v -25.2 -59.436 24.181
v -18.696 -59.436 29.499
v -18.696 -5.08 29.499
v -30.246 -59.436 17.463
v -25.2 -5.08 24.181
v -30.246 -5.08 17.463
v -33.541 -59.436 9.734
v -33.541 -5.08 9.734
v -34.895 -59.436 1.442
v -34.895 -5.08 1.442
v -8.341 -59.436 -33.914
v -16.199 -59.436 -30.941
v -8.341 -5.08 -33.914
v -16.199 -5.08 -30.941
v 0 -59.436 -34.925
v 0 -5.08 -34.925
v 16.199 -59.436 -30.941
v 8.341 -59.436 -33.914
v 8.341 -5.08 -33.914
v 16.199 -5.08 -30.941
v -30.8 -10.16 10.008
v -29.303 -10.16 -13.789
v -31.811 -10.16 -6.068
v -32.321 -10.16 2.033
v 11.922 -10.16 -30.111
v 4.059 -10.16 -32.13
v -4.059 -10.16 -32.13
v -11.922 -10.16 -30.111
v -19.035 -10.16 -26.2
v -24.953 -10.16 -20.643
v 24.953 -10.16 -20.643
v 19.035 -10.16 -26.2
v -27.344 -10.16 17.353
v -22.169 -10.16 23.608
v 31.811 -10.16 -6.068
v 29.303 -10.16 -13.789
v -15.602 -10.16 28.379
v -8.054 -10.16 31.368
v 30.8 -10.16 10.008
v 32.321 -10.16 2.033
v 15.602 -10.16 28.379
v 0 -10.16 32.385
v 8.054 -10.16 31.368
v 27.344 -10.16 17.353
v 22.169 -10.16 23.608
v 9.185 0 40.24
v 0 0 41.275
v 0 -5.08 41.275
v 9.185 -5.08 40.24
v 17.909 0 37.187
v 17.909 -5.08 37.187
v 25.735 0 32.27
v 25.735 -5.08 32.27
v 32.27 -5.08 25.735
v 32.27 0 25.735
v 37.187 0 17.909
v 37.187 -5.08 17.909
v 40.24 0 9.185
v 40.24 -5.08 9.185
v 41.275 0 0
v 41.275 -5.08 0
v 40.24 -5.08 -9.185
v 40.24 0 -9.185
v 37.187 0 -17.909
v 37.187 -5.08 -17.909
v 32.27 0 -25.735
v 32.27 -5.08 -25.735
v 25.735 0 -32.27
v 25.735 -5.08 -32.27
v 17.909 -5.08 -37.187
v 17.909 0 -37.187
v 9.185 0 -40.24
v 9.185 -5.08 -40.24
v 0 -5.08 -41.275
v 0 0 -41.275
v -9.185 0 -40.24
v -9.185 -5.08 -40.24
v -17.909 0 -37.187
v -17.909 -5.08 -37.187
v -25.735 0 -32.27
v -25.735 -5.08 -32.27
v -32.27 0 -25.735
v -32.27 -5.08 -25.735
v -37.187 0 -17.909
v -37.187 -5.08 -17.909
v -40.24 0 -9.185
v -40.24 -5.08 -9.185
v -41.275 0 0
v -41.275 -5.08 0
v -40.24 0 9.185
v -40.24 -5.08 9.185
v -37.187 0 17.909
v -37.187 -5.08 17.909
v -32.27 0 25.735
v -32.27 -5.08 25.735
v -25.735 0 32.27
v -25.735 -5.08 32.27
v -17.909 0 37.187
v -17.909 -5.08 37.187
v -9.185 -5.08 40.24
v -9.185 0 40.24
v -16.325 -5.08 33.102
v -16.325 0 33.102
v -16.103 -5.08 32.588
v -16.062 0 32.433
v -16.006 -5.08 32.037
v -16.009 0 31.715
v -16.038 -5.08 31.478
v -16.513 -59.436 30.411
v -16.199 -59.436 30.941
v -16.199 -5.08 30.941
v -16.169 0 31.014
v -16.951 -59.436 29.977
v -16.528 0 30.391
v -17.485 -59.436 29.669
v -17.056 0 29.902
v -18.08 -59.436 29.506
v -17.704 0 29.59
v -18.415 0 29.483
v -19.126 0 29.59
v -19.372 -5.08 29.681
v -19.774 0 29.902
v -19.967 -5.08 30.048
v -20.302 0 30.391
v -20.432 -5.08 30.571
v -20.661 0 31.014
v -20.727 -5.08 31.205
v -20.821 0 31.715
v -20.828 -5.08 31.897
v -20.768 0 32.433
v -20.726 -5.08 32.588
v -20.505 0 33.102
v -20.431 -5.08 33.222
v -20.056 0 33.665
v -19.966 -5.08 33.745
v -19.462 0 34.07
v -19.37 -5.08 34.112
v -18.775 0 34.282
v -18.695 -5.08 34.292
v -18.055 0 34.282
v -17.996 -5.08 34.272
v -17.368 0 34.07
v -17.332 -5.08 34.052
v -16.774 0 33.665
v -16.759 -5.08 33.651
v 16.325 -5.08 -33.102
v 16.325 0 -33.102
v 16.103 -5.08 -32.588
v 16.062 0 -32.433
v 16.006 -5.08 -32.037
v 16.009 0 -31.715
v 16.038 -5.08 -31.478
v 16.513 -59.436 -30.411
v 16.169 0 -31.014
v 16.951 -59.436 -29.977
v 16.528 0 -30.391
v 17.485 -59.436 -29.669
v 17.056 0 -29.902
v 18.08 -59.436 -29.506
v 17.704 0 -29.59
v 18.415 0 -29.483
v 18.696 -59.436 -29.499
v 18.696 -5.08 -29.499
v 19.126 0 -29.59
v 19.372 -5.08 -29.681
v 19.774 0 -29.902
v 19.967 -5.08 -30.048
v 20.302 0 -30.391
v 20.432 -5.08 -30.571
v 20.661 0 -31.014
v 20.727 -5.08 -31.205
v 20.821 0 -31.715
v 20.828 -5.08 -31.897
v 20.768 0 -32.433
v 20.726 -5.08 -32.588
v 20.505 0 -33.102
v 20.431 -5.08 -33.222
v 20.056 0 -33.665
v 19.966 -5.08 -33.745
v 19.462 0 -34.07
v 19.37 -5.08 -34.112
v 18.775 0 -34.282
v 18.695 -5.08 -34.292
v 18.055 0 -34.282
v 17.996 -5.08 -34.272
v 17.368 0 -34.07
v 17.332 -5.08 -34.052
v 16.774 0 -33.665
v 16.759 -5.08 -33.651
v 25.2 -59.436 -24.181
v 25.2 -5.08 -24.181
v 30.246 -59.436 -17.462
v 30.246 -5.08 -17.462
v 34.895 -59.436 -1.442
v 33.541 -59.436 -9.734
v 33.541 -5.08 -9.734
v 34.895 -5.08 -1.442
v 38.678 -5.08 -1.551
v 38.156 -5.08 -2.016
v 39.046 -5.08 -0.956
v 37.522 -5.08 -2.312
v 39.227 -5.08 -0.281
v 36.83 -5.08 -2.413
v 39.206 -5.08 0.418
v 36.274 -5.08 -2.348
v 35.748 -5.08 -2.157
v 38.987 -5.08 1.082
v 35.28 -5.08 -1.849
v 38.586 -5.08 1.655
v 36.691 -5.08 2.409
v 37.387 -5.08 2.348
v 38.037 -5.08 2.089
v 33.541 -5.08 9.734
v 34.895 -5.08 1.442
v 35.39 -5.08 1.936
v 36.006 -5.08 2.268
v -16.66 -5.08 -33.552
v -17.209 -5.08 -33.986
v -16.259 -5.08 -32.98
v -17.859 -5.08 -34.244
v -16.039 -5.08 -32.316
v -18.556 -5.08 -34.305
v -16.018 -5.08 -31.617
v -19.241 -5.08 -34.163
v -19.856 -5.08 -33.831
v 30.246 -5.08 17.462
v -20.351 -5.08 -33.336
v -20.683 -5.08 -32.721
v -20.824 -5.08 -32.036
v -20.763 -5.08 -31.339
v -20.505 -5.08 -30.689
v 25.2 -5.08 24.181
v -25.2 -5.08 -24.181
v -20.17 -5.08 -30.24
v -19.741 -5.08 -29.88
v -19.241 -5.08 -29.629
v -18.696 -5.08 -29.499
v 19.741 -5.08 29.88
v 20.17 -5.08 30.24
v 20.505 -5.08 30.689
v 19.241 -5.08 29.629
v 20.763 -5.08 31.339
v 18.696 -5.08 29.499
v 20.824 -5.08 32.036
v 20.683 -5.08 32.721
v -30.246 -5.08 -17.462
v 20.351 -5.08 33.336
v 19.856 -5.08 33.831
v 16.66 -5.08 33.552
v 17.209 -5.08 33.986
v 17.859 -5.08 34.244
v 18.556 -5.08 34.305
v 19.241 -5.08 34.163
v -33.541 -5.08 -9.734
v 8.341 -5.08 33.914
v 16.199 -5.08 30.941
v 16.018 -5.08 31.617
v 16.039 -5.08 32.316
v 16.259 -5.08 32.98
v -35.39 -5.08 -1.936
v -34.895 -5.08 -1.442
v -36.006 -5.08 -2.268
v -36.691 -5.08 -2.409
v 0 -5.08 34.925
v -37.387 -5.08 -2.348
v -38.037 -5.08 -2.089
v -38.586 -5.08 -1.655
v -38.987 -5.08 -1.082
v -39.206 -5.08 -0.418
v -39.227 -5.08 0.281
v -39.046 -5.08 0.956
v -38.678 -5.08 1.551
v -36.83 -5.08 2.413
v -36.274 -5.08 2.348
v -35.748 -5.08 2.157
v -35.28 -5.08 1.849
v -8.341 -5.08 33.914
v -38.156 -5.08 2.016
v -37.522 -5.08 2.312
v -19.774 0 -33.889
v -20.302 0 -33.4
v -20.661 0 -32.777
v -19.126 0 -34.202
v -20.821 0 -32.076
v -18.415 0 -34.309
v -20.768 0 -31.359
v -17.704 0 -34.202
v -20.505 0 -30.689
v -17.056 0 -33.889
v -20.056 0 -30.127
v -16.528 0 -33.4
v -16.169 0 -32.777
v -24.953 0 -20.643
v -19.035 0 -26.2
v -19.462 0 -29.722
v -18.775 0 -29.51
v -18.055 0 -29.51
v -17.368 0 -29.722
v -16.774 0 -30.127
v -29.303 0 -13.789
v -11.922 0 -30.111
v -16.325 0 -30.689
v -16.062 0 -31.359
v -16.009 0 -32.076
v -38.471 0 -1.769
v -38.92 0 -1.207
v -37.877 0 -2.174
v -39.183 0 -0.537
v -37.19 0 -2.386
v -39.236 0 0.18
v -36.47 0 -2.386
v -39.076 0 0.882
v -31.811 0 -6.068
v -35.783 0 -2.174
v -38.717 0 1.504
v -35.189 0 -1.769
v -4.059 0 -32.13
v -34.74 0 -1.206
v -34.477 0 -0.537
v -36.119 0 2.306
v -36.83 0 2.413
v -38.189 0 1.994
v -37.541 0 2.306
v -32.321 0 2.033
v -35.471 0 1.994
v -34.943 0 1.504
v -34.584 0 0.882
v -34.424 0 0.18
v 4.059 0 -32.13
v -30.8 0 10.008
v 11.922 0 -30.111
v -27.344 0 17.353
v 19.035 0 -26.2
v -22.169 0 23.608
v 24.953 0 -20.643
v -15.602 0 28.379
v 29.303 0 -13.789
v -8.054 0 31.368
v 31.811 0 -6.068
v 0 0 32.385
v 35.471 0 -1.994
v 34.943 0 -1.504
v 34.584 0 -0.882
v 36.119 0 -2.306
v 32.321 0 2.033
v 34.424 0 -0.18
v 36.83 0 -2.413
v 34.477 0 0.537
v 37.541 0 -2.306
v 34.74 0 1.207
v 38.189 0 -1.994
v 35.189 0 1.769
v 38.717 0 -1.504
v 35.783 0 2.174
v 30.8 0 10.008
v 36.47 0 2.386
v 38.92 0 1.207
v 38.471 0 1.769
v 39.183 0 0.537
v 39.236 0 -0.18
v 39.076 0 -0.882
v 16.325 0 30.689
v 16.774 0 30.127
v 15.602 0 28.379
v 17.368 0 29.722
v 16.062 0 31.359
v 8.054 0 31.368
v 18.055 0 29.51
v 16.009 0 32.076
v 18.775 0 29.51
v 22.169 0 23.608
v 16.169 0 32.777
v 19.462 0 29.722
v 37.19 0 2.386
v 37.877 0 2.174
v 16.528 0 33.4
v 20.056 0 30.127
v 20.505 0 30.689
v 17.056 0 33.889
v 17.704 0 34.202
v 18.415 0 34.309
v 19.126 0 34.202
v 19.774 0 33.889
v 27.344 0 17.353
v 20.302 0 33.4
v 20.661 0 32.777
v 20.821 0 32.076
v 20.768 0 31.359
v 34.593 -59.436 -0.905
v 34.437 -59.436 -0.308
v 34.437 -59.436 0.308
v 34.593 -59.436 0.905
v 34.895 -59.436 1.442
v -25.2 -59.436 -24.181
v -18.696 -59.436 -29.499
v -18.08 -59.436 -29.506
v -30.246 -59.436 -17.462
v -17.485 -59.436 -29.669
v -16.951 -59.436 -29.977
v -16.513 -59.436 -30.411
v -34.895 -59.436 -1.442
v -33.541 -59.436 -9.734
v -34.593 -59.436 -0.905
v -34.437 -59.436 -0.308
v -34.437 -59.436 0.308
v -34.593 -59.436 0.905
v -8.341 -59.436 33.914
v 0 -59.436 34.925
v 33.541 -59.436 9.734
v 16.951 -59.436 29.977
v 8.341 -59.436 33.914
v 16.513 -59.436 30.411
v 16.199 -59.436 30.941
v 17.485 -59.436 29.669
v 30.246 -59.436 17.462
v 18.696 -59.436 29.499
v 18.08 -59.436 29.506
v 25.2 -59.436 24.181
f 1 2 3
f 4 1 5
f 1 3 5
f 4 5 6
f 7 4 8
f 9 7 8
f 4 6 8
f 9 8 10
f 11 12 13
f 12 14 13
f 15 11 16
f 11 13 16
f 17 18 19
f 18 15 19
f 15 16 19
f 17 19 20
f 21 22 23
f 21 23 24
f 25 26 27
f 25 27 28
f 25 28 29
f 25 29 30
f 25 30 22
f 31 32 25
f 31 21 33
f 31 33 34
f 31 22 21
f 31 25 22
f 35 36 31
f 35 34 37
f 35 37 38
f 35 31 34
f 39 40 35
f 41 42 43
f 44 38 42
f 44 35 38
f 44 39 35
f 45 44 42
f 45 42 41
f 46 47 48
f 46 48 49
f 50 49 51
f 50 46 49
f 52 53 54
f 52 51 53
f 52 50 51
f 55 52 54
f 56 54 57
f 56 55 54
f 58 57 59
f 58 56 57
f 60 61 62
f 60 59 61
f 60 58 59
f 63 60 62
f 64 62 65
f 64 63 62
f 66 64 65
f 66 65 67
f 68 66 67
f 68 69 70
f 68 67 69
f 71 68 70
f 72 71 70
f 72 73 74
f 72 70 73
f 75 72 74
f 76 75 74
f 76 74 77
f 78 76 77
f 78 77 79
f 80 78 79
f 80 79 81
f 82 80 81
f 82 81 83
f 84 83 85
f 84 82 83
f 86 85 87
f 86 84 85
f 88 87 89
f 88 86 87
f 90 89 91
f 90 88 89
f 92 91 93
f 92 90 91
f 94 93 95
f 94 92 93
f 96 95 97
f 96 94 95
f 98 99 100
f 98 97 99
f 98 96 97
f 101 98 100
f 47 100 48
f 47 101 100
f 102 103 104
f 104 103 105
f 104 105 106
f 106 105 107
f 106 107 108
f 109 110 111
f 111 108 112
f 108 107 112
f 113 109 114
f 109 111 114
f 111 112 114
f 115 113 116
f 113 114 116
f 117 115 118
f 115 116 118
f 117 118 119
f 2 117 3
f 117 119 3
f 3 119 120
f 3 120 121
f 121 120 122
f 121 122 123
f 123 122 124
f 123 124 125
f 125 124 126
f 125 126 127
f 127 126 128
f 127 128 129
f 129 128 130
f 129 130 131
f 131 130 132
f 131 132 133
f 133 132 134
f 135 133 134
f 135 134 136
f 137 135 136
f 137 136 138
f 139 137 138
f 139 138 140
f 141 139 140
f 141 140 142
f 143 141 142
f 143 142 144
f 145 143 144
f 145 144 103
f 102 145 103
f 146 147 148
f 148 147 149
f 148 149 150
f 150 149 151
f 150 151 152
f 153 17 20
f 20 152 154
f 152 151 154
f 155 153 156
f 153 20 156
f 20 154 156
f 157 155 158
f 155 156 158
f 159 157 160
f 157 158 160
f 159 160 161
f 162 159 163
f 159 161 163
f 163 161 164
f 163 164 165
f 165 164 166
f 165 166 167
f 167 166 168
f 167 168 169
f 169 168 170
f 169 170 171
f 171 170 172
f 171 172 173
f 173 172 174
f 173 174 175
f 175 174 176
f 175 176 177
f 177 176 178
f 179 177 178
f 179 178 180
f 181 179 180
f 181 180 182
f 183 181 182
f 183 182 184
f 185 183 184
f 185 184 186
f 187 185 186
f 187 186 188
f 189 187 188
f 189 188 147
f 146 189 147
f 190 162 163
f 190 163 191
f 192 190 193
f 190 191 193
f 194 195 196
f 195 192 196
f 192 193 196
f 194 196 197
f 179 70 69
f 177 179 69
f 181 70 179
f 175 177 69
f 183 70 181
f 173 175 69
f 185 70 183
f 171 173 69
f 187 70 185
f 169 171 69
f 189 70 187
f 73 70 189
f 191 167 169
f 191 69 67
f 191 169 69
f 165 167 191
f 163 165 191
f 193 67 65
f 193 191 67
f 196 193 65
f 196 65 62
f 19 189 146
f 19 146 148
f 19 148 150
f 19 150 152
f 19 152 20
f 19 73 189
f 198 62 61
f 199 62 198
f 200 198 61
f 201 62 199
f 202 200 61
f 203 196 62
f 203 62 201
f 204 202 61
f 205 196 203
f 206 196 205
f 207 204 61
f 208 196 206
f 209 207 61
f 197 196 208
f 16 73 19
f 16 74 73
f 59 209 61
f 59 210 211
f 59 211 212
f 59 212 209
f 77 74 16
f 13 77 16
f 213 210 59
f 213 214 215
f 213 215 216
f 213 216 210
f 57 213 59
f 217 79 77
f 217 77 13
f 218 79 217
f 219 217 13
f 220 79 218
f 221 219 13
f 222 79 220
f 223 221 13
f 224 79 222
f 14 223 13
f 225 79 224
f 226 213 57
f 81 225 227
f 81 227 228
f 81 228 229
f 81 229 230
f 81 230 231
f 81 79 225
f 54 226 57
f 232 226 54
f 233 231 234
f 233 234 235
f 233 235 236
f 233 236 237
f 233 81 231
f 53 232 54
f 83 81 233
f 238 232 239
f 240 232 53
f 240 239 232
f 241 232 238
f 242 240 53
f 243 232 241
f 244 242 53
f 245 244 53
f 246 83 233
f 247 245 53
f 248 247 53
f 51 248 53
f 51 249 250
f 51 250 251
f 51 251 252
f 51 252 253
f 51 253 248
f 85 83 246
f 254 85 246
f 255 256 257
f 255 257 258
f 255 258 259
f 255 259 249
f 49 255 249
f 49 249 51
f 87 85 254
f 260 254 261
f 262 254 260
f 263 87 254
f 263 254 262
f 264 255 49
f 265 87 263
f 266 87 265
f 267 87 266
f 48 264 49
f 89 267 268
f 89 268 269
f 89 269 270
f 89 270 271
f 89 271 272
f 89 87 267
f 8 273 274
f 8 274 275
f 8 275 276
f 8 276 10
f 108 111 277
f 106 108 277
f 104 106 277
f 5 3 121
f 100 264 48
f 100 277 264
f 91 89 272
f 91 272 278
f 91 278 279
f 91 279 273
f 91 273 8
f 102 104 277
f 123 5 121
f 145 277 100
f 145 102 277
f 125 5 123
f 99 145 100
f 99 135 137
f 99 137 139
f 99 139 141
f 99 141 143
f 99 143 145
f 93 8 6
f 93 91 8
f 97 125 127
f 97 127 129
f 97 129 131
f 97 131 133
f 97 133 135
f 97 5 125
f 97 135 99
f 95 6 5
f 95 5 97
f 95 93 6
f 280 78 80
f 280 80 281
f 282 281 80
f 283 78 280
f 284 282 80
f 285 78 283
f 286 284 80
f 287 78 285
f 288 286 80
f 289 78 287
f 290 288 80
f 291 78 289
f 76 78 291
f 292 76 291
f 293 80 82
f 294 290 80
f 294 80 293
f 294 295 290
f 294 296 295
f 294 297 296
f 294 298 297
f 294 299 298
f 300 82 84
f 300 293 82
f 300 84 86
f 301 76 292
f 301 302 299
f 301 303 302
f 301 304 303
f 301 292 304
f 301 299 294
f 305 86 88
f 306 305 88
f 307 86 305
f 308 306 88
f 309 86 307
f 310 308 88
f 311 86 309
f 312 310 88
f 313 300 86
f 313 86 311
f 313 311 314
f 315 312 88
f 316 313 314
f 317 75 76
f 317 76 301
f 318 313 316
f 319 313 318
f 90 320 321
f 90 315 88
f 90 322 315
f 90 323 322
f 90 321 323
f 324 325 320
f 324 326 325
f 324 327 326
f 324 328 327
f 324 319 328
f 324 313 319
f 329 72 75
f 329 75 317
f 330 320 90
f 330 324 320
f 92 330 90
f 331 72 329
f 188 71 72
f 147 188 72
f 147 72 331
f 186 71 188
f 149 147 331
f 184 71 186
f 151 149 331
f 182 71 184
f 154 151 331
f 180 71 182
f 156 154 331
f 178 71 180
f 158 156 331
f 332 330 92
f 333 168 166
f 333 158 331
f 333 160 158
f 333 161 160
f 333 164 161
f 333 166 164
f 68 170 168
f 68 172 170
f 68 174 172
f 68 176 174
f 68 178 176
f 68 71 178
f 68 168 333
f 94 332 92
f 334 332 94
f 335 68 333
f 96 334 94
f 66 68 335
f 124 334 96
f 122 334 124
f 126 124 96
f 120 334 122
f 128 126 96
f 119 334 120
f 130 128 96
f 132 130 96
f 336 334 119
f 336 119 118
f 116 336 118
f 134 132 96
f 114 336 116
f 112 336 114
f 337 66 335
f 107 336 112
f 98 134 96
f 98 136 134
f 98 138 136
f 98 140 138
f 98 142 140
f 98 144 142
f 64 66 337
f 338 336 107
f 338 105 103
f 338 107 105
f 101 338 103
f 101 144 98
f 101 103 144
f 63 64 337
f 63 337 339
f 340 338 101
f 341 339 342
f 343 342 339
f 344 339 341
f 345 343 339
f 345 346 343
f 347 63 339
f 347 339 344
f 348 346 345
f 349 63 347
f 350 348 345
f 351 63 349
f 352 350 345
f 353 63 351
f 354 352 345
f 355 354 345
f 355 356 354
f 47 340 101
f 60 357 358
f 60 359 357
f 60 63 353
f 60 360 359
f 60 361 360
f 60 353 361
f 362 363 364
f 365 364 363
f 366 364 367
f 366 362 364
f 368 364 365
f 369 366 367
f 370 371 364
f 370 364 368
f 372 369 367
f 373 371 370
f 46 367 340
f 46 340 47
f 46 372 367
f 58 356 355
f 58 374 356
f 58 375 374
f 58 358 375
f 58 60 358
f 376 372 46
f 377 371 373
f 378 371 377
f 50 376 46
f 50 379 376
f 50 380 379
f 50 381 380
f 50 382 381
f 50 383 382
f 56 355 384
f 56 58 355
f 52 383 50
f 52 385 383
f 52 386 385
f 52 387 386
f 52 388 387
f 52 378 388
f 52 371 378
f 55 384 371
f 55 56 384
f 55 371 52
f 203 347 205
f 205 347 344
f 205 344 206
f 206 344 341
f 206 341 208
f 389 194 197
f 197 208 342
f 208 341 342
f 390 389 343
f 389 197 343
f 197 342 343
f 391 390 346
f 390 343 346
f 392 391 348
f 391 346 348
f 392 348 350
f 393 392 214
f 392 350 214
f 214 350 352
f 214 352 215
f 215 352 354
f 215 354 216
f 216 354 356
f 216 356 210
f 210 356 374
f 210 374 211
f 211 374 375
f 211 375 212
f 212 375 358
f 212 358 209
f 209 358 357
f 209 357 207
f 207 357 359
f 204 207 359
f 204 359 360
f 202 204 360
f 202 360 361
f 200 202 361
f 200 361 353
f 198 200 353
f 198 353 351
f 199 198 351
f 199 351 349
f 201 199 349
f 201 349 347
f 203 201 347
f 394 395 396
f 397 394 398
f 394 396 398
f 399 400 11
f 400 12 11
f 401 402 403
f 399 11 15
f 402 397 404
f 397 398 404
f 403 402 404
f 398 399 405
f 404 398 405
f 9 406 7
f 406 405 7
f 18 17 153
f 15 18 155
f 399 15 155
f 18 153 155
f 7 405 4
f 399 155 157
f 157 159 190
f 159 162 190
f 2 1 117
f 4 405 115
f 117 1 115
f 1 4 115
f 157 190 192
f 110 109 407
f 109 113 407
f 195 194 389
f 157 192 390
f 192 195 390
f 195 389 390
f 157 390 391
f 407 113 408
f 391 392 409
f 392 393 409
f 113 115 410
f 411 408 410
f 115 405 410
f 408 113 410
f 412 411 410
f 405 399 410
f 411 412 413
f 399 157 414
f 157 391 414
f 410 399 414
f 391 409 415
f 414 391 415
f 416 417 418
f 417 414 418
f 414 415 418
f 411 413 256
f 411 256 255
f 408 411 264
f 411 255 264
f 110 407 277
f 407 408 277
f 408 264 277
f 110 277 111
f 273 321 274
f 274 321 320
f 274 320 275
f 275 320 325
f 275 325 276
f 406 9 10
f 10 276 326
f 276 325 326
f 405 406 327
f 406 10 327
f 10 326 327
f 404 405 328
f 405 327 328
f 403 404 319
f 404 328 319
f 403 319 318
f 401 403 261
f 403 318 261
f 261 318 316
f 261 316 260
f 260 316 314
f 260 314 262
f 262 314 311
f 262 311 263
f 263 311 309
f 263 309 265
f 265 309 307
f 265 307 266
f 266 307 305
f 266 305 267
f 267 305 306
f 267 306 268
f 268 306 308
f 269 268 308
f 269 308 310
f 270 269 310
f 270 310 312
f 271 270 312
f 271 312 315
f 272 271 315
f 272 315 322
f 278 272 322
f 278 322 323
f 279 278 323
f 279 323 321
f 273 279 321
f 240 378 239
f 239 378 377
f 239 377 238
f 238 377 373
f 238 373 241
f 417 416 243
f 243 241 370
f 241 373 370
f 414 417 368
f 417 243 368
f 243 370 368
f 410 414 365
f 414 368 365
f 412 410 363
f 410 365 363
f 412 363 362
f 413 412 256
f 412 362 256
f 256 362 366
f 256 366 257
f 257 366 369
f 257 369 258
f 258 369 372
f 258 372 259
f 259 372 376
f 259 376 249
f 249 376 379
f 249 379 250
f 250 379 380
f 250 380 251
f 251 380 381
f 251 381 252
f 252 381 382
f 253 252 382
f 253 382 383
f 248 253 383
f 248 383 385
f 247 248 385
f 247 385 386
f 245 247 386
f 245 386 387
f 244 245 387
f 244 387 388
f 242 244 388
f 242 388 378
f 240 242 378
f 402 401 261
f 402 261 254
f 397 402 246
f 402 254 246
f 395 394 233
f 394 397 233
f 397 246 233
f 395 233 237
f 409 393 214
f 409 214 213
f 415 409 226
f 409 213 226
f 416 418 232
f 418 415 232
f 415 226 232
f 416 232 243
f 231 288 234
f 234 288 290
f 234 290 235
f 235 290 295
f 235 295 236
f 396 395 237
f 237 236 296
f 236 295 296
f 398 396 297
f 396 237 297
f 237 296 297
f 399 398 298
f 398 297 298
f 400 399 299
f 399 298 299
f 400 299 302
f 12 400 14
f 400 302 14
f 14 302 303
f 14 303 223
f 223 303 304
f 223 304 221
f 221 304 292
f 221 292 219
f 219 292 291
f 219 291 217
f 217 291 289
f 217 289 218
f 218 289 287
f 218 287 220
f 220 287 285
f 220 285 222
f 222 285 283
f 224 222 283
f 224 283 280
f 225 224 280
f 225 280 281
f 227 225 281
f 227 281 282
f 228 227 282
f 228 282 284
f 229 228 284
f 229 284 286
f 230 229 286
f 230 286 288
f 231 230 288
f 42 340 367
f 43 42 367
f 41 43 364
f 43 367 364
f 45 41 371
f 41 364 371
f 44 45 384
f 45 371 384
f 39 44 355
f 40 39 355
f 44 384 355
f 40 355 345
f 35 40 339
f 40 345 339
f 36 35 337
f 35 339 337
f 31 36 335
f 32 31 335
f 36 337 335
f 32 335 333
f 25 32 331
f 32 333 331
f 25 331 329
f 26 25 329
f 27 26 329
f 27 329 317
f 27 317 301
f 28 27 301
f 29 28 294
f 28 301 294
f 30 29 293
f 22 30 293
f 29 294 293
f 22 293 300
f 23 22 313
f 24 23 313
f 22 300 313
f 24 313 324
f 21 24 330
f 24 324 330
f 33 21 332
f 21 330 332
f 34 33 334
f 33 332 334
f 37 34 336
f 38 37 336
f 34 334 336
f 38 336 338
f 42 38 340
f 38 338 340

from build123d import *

# Parameters (mm, degrees)
SKETCH1_R                      = 41.275
BOSS_EXTRUDE1_DEPTH            = 59.436
CUT_EXTRUDE5_START             = -54.356
SKETCH7_R                      = 41.275
SKETCH7_R_2                    = 34.925
CUT_EXTRUDE5_DEPTH             = 54.356
TOP_INTERCONNECTION_HOLE_REACH = 85.306
SKETCH8_R                      = 2.413
CIRPATTERN1_COUNT              = 6
SKETCH9_R                      = 32.385
CUT_EXTRUDE8_DEPTH             = 10.16


with BuildPart() as part:
    # Sketch1 → Boss-Extrude1 (new body)
    with BuildSketch(Plane(origin=(0, 0, 0), x_dir=(1, 0, 0), z_dir=(0, 1, 0))):
        Circle(SKETCH1_R)
    extrude(amount=-BOSS_EXTRUDE1_DEPTH)

    # Sketch7 → Cut-Extrude5 (cut)
    with BuildSketch(Plane.XZ.offset(59.436).offset(CUT_EXTRUDE5_START)):
        Circle(SKETCH7_R)
        Circle(SKETCH7_R_2, mode=Mode.SUBTRACT)
    extrude(amount=CUT_EXTRUDE5_DEPTH, mode=Mode.SUBTRACT)

    # Sketch8 → Top Interconnection Hole (cut, up to next)
    with BuildSketch(Plane(origin=(0, 0, 0), x_dir=(1, 0, 0), z_dir=(0, 1, 0)), mode=Mode.PRIVATE) as top_interconnection_hole_sk1:
        with Locations((-36.83, 0)):
            Circle(SKETCH8_R)
    top_interconnection_hole_tool1 = extrude(top_interconnection_hole_sk1.sketch, amount=-TOP_INTERCONNECTION_HOLE_REACH, mode=Mode.PRIVATE) & part.part
    top_interconnection_hole = top_interconnection_hole_tool1.solids().sort_by_distance((-36.83, 0, 0))[0]
    add(top_interconnection_hole, mode=Mode.SUBTRACT)

    # CirPattern1: Top Interconnection Hole ×6 about axis
    cirpattern1_axis = Axis((0, 21.434496837, 0), (0, -1, 0))
    for i in range(1, CIRPATTERN1_COUNT):
        add(top_interconnection_hole.rotate(cirpattern1_axis, i * 360 / CIRPATTERN1_COUNT), mode=Mode.SUBTRACT)

    # Sketch9 → Cut-Extrude8 (cut)
    with BuildSketch(Plane(origin=(0, 0, 0), x_dir=(1, 0, 0), z_dir=(0, 1, 0))):
        Circle(SKETCH9_R)
    extrude(amount=-CUT_EXTRUDE8_DEPTH, mode=Mode.SUBTRACT)


solid = part.part
